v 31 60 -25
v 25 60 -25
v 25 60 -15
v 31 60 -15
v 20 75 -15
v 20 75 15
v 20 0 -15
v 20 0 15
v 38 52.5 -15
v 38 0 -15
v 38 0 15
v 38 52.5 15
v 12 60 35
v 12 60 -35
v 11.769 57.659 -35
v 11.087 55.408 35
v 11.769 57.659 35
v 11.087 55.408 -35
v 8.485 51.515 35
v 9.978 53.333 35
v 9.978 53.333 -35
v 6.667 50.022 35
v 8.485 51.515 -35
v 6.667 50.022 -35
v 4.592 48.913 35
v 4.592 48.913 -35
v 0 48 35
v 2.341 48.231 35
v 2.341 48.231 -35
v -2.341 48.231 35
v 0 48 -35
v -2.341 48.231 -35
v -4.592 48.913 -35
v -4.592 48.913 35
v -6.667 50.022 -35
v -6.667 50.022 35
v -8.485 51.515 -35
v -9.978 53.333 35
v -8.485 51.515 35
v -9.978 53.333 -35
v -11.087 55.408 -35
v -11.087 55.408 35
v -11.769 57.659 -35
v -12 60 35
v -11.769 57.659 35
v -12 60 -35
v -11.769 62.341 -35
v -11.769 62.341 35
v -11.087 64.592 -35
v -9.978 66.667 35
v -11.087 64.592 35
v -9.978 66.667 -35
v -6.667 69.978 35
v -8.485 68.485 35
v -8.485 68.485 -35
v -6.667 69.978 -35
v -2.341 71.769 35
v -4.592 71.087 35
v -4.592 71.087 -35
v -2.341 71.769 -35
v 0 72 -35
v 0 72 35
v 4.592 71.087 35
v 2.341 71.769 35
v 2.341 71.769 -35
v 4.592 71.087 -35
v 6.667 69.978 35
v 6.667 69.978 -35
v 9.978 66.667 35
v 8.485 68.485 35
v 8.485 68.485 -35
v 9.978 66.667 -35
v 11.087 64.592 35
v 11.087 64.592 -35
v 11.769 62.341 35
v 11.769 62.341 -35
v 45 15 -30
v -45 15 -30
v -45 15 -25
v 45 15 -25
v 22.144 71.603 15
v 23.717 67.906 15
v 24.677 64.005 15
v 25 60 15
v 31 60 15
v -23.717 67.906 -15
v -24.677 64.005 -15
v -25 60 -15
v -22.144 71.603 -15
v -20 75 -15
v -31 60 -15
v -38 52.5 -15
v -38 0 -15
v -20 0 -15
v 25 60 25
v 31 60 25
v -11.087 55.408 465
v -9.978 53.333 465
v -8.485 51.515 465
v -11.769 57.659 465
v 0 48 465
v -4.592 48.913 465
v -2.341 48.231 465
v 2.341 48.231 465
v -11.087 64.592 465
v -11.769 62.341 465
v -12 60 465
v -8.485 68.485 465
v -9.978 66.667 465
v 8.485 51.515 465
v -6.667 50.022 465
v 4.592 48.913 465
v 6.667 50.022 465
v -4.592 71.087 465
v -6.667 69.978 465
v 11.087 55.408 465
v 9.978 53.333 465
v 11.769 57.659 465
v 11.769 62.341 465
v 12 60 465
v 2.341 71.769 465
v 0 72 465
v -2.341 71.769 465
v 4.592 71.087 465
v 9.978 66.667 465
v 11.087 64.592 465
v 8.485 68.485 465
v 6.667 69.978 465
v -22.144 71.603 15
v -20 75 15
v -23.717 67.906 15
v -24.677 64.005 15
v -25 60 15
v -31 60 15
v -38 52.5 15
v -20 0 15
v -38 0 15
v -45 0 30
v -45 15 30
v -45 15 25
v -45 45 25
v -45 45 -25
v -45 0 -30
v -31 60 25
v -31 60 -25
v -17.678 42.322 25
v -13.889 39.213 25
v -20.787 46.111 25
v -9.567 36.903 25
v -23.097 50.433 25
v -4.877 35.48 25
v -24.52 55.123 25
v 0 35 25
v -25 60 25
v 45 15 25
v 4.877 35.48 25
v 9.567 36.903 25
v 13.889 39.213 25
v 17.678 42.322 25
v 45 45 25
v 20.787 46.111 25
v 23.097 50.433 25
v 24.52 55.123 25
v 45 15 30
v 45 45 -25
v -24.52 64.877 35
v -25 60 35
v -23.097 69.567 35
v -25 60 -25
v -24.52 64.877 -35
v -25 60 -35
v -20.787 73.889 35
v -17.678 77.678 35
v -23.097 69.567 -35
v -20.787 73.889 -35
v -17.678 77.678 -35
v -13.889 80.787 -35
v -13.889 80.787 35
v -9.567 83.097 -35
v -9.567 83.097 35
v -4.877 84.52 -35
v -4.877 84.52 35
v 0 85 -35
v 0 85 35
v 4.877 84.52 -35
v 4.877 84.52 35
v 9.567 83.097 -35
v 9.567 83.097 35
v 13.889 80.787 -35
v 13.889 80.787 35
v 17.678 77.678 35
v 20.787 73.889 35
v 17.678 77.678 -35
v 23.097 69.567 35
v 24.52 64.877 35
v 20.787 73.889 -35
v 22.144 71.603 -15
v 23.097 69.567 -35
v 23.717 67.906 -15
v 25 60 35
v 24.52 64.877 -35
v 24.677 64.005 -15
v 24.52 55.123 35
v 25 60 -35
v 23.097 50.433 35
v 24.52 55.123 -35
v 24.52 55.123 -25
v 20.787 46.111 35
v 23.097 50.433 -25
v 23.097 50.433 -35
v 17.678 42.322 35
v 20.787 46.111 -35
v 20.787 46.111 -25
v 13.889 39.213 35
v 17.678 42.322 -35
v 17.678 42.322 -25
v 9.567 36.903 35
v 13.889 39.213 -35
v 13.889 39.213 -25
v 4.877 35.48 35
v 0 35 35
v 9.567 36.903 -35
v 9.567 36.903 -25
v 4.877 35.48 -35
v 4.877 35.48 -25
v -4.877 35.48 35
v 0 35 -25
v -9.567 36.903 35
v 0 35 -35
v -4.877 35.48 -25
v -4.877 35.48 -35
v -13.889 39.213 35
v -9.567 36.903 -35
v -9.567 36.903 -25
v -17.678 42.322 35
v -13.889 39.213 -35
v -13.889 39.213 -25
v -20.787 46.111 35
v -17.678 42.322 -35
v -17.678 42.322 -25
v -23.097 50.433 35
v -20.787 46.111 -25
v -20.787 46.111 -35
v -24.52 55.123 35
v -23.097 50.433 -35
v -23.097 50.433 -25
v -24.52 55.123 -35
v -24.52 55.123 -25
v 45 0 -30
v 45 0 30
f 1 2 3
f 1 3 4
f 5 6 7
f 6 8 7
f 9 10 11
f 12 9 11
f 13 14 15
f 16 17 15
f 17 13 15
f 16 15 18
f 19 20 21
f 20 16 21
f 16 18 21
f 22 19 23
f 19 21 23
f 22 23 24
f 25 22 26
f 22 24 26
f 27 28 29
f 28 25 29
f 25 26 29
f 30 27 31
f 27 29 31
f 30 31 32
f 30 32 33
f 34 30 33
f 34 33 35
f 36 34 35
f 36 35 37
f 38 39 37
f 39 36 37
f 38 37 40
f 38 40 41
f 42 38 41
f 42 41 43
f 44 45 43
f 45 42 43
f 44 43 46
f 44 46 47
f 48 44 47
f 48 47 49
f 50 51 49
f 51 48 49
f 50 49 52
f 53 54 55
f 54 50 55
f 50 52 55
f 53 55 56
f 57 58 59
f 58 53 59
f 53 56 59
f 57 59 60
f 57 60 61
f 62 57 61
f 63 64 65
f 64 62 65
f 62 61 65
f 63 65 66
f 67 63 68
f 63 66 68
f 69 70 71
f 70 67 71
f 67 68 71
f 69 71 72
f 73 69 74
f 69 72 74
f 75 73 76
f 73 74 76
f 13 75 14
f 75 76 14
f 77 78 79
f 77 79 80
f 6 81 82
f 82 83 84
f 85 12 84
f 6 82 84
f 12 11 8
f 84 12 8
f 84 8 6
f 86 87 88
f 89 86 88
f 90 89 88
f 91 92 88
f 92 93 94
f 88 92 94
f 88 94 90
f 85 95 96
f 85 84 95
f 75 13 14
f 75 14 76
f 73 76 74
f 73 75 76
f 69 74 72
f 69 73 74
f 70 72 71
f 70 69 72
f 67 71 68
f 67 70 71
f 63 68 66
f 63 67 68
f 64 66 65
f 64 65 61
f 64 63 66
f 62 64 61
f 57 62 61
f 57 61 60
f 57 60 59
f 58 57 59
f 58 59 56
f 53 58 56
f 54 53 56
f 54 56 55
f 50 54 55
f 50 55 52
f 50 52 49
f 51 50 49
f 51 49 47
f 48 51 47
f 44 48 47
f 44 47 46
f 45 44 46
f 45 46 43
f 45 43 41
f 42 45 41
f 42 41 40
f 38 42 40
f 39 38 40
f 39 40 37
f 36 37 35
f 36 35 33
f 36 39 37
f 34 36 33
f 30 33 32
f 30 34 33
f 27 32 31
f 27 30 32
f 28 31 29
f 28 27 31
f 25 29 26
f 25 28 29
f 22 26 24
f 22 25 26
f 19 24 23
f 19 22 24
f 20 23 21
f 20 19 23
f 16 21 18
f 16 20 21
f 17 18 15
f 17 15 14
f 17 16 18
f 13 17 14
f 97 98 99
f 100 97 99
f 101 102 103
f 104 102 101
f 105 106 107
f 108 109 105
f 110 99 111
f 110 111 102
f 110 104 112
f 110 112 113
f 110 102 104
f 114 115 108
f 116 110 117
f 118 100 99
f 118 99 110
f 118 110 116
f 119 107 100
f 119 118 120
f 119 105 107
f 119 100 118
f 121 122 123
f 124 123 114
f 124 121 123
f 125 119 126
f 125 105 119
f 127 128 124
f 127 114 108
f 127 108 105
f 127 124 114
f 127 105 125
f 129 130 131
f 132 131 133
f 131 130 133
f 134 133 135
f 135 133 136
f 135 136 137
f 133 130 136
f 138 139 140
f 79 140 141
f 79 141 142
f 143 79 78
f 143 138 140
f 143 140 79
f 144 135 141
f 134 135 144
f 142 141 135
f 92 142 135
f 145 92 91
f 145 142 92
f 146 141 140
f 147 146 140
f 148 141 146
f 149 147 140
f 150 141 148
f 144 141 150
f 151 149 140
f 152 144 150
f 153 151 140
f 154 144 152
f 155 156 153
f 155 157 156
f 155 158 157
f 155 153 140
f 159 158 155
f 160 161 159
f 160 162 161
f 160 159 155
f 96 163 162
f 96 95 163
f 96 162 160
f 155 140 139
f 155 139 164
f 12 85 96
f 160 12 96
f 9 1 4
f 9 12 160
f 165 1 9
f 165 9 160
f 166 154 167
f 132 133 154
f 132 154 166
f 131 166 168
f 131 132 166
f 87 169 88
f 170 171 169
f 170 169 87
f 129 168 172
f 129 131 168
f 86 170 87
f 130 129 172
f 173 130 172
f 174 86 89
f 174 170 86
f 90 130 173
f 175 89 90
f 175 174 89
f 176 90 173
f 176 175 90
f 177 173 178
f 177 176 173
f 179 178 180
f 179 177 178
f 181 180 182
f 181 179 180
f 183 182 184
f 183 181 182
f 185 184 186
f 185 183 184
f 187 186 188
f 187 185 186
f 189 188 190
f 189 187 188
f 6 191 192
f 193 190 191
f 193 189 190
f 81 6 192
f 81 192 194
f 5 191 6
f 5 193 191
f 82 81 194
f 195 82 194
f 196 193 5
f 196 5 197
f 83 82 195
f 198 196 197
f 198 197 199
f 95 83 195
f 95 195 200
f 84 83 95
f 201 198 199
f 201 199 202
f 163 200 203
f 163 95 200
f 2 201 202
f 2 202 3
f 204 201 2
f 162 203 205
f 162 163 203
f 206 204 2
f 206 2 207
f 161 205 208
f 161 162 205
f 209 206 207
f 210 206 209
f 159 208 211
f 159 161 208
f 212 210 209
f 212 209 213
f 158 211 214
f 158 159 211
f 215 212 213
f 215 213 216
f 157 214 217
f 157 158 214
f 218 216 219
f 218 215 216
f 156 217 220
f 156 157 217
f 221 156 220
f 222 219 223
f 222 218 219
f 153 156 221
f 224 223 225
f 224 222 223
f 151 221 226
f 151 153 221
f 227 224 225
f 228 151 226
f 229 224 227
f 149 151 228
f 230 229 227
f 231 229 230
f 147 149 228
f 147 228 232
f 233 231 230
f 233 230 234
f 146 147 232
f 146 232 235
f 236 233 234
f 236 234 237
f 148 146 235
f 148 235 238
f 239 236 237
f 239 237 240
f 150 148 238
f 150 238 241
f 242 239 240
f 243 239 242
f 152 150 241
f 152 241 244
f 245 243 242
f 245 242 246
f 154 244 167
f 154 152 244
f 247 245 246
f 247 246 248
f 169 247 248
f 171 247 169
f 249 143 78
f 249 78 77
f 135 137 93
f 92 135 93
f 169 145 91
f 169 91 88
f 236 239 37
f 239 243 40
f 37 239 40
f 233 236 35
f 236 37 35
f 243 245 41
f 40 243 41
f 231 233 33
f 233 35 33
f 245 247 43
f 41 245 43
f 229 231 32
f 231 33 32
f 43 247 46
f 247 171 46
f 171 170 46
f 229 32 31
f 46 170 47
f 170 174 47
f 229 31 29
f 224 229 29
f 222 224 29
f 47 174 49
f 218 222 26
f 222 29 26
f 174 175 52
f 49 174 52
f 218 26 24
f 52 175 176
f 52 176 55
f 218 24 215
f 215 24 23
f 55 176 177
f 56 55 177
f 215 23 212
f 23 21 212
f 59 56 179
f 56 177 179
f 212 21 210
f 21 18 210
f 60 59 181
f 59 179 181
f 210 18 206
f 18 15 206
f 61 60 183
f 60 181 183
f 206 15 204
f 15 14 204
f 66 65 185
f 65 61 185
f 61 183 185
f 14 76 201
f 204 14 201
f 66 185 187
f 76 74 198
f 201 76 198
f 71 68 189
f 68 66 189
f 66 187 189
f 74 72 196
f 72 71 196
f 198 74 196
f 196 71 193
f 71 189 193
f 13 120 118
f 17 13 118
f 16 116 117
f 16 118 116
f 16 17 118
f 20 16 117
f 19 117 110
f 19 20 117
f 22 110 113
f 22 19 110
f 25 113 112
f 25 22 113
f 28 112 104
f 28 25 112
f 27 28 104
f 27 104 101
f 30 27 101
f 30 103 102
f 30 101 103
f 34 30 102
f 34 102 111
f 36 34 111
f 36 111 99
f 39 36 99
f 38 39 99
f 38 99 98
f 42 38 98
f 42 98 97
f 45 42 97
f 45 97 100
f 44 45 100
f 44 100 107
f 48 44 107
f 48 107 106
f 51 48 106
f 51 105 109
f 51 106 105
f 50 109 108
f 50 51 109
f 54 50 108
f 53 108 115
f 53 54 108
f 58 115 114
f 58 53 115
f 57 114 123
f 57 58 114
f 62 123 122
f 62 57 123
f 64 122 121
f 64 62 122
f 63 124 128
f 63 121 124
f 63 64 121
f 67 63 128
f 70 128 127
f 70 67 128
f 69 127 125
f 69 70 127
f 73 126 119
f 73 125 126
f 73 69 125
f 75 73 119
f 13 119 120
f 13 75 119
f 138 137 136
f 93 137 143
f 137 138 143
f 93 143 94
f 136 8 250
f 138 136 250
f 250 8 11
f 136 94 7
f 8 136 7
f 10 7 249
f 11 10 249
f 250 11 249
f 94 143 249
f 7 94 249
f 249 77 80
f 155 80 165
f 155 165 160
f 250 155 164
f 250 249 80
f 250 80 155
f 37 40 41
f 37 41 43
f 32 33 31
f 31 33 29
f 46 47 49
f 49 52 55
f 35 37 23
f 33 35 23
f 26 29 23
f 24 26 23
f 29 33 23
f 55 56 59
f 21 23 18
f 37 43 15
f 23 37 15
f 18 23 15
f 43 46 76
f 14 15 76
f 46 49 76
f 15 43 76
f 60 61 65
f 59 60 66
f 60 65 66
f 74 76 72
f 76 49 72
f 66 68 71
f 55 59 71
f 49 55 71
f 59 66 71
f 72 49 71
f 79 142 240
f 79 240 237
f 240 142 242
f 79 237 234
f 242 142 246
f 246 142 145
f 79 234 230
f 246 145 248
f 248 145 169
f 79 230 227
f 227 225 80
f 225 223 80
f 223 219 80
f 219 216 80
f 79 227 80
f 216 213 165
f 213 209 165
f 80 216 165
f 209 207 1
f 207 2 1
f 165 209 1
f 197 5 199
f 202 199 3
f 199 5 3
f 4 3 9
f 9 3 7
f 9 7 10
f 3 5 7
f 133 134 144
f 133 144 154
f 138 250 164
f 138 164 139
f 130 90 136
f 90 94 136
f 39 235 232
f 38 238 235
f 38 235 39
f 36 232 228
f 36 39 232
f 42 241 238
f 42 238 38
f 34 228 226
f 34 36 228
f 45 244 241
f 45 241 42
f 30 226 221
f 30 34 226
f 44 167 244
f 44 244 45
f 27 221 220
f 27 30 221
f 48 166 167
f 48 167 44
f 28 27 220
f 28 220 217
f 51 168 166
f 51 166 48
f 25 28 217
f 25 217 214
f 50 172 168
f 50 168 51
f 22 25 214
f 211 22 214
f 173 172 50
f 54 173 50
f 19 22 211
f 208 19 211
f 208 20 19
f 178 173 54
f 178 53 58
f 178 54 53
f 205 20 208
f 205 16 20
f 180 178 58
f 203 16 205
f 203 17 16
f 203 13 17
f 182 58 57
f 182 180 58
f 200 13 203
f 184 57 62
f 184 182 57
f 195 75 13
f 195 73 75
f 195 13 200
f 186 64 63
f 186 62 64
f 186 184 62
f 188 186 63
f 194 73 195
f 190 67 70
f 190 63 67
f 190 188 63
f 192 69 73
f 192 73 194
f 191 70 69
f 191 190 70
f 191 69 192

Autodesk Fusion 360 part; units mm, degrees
sketch "Sketch1" plane through (0, 0, 0) normal (0, 1, 0) x (1, 0, 0)
  line L0 (45, -30) -> (-45, -30)
  line L1 (-45, -30) -> (-45, 30)
  line L2 (-45, 30) -> (45, 30)
  line L3 (45, 30) -> (45, -30)
  line L4 (45, -30) -> (-45, 30) construction
  line L5 (-45, -30) -> (45, 30) construction
  dimension "d1" = 90
  dimension "d2" = 60
extrude "Extrude1" add sketch "Sketch1" along normal blind 15 makes body 1
sketch "Sketch2" plane through (0, 0, 30) normal (0, 0, 1) x (1, 0, 0)
  line L0 (-45, 0) -> (45, 0)
  line L1 (45, 0) -> (45, 15)
  line L2 (45, 15) -> (-45, 15)
  line L3 (-45, 15) -> (-45, 0)
  line L4 (-45, 15) -> (-45, 45)
  line L5 (45, 15) -> (45, 45)
  line L6 (0, 15) -> (0, 60) construction
  arc A0 (-25, 60) -> (25, 60) centre (0, 60) ccw
  line L7 (-45, 45) -> (-31, 45) construction
  line L8 (45, 45) -> (31, 45) construction
  line L9 (-31, 45) -> (-31, 60) construction
  line L10 (31, 45) -> (31, 60) construction
  line L11 (-45, 45) -> (-31, 60)
  line L12 (-31, 60) -> (-25, 60)
  line L13 (25, 60) -> (31, 60)
  line L14 (31, 60) -> (45, 45)
  dimension "d5" = 30
  dimension "d6" = 45
  dimension "d7" = 25
  dimension "d8" = 14
  dimension "d9" = 14
  dimension "d10" = 15
  dimension "d11" = 15
extrude "Extrude2" add sketch "Sketch2" along normal blind -5 and the other way blind 55 contours L2 L4 L5 A0 L11 L12 L13 L14 bodies 1
sketch "Sketch3" plane through (0, 0, 25) normal (0, 0, 1) x (1, 0, 0)
  line L0 (45, 15) -> (45, 45)
  line L1 (45, 45) -> (31, 60)
  line L2 (31, 60) -> (25, 60)
  arc A0 (-25, 60) -> (25, 60) centre (0, 60) ccw
  line L3 (-25, 60) -> (-31, 60)
  line L4 (-31, 60) -> (-45, 45)
  line L5 (-45, 45) -> (-45, 15)
  line L6 (-45, 15) -> (45, 15)
  circle A1 centre (0, 60) radius 25
  circle A2 centre (0, 60) radius 12
  dimension "d16" = 50
  dimension "d17" = 24
extrude "Extrude3" add sketch "Sketch3" along normal blind 10 and the other way blind 60 contours A0 A1 bodies 1
sketch "Sketch4" plane through (0, 60, 0) normal (0, 1, 0) x (-1, 0, 0)
  line L0 (31, 25) -> (25, 25)
  line L1 (25, 25) -> (25, -25)
  line L2 (25, -25) -> (31, -25)
  line L3 (31, -25) -> (31, 25)
  line L4 (38, -15) -> (20, -15)
  line L5 (20, -15) -> (20, 15)
  line L6 (20, 15) -> (38, 15)
  line L7 (38, 15) -> (38, -15)
  line L8 (45, 25) -> (45, -25)
  line L9 (45, -25) -> (31, -25)
  line L10 (-20, 15) -> (-20, -15)
  line L11 (-20, -15) -> (-38, -15)
  line L12 (-38, -15) -> (-38, 15)
  line L13 (-38, 15) -> (-20, 15)
  dimension "d22" = 18
  dimension "d23" = 30
  dimension "d24" = 7
  dimension "d25" = 10
  dimension "d28" = -58
  dimension "d29" = 0
  dimension "d30" = 40
extrude "Extrude4" cut sketch "Sketch4" along normal blind 50 and the other way blind 60 contours L3 L4 L6 L7 | L1 L3 L4 L6 | L1 L4 L5 L6 | L10 L11 L12 L13 bodies 1
sketch "Sketch5" plane through (0, 0, 35) normal (0, 0, 1) x (1, 0, 0)
  circle A0 centre (0, 60) radius 12
  circle A1 centre (0, 60) radius 25
  circle A2 centre (0, 60) radius 12
  dimension "d35" = 24
extrude "Extrude5" add sketch "Sketch5" along normal blind 430 and the other way blind 70 separate body contours A0 A2 makes body 2
copy_body "Body->Comp1" bodies 1 removing the originals makes body 3 in component "Detail"
copy_body "Body->Comp2" bodies 2 removing the originals makes body 4 in component "Rod"
component "Detail" placed x (1, 0, 0) y (0, 1, 0) z (0, 0, 1) at (0, 0, 0)
component "Rod" placed x (1, 0, 0) y (0, 1, 0) z (0, 0, 1) at (0, 0, 0)
